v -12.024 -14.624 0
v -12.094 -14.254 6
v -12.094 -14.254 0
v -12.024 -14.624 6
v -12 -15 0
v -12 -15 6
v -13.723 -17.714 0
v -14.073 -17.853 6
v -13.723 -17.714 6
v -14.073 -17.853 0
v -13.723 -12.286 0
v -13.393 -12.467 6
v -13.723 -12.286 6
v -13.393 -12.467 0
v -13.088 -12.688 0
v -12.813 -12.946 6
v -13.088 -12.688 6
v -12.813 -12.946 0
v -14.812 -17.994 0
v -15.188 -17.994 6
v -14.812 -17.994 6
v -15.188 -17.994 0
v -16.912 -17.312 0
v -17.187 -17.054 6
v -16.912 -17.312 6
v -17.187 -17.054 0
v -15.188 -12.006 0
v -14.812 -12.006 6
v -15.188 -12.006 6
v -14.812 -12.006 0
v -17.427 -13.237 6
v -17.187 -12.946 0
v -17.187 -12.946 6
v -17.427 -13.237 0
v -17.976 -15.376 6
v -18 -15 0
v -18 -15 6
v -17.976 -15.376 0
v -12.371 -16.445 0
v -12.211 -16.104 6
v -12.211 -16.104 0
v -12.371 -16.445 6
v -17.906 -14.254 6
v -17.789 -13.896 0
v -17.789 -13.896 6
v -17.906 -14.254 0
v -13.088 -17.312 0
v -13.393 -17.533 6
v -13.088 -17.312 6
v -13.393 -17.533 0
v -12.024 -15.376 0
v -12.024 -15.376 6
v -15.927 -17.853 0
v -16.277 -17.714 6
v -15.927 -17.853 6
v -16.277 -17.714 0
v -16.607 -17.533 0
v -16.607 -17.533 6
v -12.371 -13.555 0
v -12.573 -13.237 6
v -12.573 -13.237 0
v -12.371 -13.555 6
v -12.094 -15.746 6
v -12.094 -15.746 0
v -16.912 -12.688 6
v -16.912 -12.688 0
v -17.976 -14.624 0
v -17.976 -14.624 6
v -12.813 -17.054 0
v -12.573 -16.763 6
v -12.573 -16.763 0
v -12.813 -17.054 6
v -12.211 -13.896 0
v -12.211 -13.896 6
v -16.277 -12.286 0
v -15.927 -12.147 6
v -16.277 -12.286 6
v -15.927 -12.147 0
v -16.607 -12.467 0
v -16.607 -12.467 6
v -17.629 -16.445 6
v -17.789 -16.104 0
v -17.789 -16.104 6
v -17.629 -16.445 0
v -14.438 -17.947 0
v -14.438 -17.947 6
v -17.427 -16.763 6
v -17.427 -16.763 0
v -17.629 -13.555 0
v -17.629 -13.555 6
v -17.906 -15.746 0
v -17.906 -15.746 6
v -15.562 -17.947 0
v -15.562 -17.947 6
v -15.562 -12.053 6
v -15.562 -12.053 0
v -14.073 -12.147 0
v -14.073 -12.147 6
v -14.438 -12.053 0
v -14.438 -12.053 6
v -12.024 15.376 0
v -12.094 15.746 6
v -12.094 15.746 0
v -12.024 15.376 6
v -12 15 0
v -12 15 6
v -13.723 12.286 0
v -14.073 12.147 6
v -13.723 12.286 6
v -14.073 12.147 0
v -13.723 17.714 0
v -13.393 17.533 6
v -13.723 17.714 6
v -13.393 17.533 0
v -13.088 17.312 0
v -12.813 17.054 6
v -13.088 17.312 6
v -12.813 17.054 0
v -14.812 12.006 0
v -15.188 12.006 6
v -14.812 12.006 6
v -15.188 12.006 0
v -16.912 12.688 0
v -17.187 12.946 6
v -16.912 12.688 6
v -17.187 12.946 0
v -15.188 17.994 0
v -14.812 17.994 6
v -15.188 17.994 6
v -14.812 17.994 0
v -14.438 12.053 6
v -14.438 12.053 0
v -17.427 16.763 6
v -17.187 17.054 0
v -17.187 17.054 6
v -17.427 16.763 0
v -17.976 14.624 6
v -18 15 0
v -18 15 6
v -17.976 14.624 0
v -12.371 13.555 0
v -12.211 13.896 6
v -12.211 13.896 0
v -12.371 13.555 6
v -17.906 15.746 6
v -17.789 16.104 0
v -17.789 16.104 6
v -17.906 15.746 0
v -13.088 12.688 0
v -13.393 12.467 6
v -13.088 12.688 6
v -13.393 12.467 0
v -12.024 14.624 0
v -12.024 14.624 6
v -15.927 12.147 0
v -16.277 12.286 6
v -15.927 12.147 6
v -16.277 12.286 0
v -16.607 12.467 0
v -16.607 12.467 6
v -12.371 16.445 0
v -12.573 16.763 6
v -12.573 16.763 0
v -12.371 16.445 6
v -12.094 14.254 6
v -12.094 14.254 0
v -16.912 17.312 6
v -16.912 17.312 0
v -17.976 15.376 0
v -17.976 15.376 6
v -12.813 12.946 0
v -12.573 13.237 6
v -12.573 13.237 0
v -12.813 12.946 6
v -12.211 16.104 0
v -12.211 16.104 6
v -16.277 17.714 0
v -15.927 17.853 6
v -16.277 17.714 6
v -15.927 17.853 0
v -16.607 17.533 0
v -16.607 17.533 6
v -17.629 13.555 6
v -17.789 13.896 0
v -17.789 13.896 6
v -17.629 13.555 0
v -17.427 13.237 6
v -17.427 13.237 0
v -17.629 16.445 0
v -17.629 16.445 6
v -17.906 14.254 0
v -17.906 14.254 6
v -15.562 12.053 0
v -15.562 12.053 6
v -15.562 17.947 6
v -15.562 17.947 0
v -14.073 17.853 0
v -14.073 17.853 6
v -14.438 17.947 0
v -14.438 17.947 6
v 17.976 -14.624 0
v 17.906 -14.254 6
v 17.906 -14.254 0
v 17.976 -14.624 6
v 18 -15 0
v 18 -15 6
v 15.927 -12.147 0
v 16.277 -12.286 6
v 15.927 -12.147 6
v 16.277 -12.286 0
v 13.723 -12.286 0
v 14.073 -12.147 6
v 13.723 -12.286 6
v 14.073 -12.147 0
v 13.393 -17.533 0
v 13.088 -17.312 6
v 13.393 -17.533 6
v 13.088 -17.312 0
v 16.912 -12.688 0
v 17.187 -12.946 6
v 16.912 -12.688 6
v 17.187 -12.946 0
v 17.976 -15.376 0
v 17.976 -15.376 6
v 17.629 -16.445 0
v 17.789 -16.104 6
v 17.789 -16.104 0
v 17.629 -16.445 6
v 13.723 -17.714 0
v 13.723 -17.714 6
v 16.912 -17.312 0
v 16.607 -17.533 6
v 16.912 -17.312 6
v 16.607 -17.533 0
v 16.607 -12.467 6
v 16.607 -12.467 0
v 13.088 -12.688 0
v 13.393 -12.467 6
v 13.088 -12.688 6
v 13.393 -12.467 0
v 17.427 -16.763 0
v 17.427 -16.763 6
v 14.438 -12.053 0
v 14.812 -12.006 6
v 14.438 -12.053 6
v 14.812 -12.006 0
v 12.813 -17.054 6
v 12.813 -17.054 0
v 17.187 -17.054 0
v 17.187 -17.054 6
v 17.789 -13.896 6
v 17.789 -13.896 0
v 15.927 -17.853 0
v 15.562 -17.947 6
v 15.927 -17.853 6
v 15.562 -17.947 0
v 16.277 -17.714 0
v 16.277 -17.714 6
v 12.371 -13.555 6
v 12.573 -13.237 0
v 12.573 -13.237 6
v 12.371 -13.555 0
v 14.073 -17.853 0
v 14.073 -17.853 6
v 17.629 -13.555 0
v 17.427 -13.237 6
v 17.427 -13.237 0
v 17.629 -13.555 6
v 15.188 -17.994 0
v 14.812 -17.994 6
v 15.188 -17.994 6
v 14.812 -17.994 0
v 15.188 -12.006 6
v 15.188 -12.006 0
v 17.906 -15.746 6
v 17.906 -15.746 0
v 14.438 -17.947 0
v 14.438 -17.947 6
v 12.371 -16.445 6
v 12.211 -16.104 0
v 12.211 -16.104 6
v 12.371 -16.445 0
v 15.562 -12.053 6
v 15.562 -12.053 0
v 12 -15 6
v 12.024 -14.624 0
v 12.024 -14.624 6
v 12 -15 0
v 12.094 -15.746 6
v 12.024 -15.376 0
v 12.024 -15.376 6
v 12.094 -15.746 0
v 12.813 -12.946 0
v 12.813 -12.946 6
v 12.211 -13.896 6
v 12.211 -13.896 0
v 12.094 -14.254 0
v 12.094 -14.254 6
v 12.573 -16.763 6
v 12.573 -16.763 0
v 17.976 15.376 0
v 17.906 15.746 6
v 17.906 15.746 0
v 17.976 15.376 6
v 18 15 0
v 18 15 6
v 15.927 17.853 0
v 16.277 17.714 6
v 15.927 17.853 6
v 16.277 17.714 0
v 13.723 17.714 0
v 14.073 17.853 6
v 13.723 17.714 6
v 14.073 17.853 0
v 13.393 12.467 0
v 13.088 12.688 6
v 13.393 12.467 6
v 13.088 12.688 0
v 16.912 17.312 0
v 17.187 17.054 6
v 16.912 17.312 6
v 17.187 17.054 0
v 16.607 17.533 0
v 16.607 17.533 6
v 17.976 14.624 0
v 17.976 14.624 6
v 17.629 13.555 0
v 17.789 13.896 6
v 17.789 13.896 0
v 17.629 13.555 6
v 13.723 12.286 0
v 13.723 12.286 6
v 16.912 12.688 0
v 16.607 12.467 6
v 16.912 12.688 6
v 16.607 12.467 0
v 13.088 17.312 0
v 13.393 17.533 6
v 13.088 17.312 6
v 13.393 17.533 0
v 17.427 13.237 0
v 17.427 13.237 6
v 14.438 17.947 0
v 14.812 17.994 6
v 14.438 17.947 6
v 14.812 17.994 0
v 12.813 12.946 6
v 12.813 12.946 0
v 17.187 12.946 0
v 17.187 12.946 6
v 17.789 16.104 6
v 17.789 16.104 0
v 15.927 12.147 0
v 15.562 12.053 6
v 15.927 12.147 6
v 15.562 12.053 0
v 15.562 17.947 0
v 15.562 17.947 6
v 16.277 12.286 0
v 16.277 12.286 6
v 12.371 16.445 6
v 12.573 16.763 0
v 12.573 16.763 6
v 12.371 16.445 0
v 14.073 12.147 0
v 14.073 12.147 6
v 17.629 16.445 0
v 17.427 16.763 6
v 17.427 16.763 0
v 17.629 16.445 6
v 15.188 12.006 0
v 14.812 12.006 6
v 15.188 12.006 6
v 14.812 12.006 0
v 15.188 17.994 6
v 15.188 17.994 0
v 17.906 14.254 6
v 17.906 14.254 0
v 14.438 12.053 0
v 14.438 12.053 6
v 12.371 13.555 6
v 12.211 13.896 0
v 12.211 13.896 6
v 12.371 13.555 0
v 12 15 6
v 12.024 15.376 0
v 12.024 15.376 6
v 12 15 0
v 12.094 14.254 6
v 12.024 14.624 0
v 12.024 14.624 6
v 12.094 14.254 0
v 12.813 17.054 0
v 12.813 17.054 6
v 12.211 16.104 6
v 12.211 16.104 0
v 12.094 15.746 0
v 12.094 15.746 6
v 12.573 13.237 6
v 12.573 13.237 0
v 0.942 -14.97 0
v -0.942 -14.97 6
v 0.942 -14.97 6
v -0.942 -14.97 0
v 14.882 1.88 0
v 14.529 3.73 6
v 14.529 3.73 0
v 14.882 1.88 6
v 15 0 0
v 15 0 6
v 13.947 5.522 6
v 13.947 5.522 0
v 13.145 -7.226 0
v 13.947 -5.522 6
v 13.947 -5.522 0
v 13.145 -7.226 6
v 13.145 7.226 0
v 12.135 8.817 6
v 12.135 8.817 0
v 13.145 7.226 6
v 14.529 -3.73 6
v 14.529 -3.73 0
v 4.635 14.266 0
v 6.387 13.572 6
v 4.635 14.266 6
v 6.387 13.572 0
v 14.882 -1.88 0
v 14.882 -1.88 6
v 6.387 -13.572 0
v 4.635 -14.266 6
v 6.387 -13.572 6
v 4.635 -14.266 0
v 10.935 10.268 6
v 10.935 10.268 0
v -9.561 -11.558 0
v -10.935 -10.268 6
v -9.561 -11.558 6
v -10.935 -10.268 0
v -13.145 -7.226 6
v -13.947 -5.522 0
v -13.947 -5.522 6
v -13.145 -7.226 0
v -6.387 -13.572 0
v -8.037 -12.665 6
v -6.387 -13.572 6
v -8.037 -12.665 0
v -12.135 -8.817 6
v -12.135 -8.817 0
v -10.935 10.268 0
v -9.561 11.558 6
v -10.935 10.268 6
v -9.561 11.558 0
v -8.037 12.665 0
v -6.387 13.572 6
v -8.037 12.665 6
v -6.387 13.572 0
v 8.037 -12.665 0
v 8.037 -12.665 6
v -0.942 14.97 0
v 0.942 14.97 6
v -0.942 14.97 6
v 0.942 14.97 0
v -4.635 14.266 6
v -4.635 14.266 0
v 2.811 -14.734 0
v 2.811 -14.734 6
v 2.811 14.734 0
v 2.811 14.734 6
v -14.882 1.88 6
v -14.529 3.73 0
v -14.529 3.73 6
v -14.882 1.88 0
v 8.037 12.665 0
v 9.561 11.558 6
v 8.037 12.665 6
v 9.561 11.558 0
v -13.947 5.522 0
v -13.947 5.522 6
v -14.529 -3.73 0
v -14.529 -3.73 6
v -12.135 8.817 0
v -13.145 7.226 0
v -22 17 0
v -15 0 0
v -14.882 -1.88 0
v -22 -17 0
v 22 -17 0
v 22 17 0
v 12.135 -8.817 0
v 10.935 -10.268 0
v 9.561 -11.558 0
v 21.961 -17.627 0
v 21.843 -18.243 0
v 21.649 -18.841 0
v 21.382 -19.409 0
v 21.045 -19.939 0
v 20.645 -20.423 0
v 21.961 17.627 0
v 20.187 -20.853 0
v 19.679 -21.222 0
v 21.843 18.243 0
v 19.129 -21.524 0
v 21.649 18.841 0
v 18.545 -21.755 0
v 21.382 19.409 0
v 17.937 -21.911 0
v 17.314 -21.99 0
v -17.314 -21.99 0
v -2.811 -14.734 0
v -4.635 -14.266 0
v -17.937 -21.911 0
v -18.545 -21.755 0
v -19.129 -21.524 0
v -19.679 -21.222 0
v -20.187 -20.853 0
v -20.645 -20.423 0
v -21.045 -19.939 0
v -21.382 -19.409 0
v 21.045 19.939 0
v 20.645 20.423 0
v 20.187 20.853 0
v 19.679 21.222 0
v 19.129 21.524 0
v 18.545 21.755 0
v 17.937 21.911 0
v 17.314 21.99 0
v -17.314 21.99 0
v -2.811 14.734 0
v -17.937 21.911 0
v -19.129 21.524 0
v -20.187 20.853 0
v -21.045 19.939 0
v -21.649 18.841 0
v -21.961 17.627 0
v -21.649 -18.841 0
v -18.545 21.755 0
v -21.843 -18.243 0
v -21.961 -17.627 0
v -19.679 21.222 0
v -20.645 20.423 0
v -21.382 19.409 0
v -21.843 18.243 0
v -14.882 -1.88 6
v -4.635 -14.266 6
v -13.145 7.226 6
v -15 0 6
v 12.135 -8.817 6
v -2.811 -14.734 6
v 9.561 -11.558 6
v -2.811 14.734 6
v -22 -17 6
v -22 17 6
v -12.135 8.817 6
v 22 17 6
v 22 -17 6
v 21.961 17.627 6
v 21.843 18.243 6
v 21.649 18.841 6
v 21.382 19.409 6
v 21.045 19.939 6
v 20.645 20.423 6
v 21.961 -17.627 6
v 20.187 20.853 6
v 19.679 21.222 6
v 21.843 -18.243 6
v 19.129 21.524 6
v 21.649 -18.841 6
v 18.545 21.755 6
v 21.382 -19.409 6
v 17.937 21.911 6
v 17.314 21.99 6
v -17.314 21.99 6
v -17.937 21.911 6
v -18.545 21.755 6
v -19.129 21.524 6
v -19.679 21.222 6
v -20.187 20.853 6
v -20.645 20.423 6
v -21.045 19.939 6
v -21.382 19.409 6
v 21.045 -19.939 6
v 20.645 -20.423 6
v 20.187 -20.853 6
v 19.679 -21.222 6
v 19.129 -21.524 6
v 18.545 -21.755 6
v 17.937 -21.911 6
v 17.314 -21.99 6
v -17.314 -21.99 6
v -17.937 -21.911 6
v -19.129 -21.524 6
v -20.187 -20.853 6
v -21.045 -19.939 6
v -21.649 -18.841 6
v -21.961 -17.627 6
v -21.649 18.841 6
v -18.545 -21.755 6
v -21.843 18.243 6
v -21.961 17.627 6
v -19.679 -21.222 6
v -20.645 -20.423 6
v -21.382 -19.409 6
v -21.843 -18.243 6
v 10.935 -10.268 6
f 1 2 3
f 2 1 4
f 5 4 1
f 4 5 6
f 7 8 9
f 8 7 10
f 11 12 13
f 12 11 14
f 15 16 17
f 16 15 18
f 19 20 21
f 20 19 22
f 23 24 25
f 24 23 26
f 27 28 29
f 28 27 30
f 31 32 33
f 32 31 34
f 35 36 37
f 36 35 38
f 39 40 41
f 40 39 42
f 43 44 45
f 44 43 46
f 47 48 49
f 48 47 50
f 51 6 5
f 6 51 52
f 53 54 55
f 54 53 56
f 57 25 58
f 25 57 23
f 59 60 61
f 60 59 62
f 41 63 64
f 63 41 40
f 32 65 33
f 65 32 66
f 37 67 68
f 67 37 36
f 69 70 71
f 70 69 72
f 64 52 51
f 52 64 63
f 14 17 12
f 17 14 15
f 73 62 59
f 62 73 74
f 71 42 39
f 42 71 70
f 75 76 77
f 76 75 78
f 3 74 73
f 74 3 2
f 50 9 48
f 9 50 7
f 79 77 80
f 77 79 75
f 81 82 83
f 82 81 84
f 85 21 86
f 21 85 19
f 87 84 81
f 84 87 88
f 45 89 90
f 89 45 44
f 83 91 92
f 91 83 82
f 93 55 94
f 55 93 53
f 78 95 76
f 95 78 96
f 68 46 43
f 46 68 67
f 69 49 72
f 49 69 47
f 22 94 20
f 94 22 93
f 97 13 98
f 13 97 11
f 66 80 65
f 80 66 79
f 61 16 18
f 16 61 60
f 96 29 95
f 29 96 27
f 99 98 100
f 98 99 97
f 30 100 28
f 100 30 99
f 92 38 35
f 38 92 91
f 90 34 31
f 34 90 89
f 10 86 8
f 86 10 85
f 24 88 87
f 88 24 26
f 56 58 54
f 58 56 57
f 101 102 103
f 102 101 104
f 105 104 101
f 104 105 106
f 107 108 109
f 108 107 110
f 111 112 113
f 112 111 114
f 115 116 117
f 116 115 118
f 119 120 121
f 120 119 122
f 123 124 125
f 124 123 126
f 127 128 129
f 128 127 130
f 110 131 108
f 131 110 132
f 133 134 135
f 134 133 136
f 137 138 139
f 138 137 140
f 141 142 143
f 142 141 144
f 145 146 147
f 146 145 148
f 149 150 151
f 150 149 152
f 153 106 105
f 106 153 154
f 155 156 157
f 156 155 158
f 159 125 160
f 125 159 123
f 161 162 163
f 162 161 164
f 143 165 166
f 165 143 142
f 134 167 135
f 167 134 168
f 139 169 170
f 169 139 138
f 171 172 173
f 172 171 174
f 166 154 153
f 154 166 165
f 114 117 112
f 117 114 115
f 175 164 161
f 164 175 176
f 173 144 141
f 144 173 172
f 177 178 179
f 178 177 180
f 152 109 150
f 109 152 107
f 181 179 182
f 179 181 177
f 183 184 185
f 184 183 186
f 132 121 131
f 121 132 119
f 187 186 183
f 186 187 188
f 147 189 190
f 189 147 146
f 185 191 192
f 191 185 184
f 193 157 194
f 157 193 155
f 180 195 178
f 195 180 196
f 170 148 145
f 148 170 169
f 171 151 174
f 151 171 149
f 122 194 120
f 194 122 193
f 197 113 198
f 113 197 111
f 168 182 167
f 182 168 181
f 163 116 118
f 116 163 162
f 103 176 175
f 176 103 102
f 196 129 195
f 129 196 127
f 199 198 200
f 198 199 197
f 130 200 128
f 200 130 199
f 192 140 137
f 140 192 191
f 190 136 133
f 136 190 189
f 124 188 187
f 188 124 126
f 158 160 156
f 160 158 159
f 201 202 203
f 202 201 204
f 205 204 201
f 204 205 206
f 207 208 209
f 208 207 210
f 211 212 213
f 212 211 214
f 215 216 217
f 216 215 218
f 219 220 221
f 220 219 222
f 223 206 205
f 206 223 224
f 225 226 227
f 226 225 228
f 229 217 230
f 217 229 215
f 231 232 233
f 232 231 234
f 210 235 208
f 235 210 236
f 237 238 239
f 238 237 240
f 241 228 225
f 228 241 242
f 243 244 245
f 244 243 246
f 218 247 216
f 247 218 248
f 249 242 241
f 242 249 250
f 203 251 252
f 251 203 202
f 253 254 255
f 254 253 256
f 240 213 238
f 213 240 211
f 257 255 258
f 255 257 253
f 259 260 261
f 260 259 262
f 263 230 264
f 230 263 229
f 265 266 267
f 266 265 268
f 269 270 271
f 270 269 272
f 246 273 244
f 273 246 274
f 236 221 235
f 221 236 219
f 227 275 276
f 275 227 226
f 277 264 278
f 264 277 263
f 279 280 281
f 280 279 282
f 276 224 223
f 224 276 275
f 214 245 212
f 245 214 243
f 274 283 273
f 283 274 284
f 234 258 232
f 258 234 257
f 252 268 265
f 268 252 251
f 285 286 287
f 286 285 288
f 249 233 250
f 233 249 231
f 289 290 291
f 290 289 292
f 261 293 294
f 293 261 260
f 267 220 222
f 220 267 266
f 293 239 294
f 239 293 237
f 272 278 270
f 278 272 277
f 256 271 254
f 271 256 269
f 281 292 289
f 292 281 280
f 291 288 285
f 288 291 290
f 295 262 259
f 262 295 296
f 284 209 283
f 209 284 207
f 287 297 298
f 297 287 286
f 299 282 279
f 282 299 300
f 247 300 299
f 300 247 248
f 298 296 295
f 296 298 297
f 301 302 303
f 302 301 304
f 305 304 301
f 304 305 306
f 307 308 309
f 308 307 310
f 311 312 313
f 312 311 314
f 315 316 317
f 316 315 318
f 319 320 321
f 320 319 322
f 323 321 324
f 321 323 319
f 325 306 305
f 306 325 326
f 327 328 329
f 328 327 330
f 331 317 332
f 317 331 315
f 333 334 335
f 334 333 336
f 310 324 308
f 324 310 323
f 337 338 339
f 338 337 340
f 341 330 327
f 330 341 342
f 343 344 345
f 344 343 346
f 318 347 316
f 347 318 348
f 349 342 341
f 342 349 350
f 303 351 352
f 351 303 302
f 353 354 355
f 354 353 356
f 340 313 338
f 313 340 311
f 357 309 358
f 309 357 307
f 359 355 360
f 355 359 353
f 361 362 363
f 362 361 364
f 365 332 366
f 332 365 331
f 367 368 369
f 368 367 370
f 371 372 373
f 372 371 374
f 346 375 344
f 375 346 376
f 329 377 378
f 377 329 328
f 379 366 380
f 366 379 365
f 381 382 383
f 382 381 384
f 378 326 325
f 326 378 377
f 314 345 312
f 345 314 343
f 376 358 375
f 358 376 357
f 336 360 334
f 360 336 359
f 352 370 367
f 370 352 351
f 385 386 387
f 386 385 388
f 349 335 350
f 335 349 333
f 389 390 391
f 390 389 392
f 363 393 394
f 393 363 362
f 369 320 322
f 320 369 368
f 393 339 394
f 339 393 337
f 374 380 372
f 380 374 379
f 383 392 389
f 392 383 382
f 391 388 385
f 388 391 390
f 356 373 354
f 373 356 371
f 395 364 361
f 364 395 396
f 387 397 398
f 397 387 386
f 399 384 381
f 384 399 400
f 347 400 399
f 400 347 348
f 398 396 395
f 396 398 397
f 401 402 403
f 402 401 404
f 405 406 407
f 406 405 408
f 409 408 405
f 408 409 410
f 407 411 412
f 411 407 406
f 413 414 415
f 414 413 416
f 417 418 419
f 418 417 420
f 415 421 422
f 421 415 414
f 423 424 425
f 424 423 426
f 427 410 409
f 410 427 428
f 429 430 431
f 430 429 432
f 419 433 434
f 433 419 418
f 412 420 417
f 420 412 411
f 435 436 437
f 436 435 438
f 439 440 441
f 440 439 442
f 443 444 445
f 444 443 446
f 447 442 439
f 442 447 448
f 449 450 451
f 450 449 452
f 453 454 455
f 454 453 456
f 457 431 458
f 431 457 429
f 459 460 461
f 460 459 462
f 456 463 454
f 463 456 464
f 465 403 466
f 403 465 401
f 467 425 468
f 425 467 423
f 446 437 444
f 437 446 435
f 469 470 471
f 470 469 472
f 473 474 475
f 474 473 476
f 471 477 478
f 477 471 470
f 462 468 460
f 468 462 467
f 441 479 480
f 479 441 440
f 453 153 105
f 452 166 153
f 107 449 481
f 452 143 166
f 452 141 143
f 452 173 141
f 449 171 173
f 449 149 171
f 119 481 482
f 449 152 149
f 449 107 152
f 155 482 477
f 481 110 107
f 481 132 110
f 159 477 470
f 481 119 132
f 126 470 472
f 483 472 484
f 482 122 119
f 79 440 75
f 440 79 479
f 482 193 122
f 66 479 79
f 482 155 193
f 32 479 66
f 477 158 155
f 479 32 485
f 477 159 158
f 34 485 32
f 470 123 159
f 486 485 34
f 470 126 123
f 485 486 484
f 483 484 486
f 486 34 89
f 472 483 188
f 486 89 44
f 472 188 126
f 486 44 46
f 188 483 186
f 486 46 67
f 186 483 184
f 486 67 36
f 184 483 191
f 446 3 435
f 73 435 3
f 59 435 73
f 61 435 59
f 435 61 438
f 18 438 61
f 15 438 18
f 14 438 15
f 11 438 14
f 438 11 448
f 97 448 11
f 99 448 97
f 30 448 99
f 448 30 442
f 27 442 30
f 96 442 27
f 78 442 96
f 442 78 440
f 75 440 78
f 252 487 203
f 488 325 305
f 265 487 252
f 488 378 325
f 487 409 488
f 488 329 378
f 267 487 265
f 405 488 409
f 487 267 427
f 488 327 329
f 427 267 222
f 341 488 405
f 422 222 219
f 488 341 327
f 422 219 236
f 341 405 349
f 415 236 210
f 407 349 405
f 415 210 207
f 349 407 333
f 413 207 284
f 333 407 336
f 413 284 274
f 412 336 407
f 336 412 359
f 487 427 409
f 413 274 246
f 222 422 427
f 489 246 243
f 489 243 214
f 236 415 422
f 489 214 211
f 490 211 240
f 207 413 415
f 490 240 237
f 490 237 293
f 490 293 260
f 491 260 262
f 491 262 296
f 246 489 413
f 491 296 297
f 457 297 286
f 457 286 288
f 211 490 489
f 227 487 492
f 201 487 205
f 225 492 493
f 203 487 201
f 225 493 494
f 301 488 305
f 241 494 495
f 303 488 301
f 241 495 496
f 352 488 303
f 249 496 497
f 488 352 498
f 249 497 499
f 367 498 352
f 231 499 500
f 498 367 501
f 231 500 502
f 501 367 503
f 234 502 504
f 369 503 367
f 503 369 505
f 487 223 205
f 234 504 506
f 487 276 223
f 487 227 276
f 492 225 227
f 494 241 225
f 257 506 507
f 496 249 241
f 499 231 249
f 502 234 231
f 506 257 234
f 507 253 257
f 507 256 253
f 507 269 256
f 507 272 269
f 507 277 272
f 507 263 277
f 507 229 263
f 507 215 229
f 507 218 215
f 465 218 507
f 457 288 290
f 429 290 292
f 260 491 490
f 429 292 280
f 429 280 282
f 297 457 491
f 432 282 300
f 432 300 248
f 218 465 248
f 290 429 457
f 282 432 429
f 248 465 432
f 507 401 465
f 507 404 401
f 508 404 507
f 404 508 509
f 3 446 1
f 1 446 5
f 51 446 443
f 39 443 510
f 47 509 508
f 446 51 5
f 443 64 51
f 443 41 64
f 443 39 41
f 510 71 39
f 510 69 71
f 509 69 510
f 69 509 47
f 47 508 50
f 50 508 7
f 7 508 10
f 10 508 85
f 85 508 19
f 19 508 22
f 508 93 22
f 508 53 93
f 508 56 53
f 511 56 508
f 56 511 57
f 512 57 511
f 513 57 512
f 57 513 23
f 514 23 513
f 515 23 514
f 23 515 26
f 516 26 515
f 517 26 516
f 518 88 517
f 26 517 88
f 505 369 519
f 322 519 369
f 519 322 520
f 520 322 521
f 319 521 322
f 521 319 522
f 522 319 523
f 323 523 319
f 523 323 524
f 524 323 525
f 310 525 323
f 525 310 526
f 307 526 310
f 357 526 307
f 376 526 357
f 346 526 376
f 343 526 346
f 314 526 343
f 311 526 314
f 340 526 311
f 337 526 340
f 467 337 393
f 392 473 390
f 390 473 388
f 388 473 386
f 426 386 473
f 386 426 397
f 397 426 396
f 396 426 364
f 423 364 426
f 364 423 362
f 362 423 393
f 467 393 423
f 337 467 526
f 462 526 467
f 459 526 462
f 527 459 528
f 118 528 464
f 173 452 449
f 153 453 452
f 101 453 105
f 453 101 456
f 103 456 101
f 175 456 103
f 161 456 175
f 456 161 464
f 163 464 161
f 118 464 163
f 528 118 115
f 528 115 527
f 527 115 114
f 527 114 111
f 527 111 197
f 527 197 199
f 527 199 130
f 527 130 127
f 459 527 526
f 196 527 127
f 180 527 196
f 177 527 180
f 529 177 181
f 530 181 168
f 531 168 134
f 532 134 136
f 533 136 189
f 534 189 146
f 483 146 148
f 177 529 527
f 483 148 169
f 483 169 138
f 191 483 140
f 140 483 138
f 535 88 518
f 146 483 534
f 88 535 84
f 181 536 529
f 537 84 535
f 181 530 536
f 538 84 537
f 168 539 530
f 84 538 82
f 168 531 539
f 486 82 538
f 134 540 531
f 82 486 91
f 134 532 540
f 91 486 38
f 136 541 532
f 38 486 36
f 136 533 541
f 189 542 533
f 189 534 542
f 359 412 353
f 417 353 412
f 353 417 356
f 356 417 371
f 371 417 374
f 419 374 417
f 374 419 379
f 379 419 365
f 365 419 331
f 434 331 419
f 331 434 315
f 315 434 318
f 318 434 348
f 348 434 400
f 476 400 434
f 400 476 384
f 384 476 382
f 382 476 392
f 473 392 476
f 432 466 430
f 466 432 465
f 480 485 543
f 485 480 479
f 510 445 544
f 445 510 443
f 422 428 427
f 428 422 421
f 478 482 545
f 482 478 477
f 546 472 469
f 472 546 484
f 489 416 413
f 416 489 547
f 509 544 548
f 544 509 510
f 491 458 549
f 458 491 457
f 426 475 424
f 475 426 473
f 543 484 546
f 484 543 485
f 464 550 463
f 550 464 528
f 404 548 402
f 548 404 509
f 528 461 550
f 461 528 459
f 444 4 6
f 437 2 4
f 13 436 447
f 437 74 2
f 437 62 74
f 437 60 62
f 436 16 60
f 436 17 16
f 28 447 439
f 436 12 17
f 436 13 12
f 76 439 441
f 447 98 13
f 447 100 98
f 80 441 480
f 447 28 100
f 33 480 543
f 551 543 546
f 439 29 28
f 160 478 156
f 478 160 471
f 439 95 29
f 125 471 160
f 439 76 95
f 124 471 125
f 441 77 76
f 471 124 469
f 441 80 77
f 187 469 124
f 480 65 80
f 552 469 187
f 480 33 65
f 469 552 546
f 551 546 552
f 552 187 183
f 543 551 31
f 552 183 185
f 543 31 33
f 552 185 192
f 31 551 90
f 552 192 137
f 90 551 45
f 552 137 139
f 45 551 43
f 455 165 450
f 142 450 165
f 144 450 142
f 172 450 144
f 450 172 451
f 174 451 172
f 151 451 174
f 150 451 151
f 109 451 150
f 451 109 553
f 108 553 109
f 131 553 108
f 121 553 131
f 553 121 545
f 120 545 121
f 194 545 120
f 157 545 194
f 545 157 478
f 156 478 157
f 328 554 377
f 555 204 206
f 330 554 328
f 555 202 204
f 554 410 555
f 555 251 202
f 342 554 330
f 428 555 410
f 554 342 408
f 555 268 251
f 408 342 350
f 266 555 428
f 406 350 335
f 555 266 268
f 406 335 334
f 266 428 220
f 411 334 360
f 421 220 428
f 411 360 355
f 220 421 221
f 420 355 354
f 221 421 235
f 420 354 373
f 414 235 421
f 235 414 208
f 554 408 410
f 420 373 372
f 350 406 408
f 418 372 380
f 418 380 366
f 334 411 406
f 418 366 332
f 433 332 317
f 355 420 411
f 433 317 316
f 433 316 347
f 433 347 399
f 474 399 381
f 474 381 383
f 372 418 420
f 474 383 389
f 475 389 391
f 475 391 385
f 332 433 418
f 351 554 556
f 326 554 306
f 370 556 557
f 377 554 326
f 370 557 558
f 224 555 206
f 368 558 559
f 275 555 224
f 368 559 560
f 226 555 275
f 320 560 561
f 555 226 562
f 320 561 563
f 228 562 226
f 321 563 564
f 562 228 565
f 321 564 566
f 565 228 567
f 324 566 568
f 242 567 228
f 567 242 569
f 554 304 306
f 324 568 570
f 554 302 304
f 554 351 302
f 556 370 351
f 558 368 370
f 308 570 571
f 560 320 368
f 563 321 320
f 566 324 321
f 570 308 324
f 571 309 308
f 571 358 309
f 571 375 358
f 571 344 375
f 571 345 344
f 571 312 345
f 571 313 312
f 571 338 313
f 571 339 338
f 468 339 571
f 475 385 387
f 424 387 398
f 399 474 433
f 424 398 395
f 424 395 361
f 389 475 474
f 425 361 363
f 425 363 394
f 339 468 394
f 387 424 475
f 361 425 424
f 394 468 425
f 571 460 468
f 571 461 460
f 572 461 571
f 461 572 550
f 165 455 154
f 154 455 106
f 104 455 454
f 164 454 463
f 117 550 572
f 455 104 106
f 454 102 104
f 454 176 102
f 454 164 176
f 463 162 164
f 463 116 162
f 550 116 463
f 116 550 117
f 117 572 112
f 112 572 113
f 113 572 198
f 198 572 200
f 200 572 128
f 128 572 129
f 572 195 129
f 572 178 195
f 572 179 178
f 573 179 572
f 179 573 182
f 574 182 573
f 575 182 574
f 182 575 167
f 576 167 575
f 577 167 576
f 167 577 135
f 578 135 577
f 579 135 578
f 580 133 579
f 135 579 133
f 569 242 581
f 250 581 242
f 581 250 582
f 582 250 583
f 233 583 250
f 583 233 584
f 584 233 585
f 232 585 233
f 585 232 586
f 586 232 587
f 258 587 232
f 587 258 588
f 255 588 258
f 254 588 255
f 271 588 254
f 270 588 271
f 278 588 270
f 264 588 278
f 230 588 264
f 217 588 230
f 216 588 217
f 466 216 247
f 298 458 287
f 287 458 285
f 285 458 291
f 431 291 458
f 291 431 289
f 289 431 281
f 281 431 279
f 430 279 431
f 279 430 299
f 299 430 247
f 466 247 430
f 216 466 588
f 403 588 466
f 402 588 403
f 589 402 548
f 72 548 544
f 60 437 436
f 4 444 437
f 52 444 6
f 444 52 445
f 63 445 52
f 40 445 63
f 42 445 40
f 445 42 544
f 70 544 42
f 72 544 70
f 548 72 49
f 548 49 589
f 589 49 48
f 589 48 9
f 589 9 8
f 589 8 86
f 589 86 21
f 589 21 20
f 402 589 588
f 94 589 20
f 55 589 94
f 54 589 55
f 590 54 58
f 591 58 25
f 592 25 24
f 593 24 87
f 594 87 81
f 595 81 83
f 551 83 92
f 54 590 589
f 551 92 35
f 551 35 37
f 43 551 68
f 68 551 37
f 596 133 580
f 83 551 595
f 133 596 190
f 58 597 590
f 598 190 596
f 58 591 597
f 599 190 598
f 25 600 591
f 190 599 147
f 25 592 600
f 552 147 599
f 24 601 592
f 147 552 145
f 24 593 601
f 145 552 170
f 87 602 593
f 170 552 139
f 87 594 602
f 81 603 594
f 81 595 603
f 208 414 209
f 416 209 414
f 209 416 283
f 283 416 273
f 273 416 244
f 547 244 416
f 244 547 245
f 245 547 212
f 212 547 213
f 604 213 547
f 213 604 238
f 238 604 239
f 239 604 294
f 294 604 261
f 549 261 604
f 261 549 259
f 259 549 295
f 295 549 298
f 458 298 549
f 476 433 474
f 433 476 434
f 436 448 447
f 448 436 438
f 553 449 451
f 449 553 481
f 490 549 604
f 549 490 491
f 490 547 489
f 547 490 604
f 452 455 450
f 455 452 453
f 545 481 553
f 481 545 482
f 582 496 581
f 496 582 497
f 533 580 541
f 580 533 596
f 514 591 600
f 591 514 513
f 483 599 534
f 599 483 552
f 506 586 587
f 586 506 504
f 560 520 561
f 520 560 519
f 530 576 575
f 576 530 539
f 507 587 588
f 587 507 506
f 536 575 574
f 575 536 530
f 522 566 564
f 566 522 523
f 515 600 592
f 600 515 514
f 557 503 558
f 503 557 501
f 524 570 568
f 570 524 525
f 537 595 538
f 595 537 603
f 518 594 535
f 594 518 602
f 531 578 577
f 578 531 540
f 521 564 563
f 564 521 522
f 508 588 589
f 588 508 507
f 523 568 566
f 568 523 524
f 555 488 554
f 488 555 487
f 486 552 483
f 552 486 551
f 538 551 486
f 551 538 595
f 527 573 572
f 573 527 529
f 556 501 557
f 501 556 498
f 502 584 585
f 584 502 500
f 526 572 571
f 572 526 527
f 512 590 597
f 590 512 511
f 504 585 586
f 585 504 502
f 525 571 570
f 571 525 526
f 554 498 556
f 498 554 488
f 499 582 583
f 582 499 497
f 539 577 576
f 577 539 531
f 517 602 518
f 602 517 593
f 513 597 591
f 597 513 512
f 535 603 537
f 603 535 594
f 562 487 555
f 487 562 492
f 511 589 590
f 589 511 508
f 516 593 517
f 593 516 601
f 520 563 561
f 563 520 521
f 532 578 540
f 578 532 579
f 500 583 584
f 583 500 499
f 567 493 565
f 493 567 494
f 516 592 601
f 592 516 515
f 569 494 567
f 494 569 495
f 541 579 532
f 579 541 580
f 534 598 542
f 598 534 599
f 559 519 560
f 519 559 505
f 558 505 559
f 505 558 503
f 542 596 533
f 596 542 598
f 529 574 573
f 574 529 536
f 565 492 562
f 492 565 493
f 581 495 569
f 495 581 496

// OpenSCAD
$fn = 50;

difference() {
	union() {
		hull() {
			translate(v = [-17.0, 17.0, 0]) {
				cylinder(h = 6, r = 5);
			}
			translate(v = [17.0, 17.0, 0]) {
				cylinder(h = 6, r = 5);
			}
			translate(v = [-17.0, -17.0, 0]) {
				cylinder(h = 6, r = 5);
			}
			translate(v = [17.0, -17.0, 0]) {
				cylinder(h = 6, r = 5);
			}
		}
	}
	union() {
		translate(v = [-15.0, -15.0, -100.0]) {
			cylinder(h = 200, r = 3.0);
		}
		translate(v = [-15.0, 15.0, -100.0]) {
			cylinder(h = 200, r = 3.0);
		}
		translate(v = [15.0, -15.0, -100.0]) {
			cylinder(h = 200, r = 3.0);
		}
		translate(v = [15.0, 15.0, -100.0]) {
			cylinder(h = 200, r = 3.0);
		}
		translate(v = [-15.0, -15.0, -100.0]) {
			cylinder(h = 200, r = 1.5);
		}
		translate(v = [-15.0, 15.0, -100.0]) {
			cylinder(h = 200, r = 1.5);
		}
		translate(v = [15.0, -15.0, -100.0]) {
			cylinder(h = 200, r = 1.5);
		}
		translate(v = [15.0, 15.0, -100.0]) {
			cylinder(h = 200, r = 1.5);
		}
		cylinder(h = 6, r = 15.0);
	}
}
